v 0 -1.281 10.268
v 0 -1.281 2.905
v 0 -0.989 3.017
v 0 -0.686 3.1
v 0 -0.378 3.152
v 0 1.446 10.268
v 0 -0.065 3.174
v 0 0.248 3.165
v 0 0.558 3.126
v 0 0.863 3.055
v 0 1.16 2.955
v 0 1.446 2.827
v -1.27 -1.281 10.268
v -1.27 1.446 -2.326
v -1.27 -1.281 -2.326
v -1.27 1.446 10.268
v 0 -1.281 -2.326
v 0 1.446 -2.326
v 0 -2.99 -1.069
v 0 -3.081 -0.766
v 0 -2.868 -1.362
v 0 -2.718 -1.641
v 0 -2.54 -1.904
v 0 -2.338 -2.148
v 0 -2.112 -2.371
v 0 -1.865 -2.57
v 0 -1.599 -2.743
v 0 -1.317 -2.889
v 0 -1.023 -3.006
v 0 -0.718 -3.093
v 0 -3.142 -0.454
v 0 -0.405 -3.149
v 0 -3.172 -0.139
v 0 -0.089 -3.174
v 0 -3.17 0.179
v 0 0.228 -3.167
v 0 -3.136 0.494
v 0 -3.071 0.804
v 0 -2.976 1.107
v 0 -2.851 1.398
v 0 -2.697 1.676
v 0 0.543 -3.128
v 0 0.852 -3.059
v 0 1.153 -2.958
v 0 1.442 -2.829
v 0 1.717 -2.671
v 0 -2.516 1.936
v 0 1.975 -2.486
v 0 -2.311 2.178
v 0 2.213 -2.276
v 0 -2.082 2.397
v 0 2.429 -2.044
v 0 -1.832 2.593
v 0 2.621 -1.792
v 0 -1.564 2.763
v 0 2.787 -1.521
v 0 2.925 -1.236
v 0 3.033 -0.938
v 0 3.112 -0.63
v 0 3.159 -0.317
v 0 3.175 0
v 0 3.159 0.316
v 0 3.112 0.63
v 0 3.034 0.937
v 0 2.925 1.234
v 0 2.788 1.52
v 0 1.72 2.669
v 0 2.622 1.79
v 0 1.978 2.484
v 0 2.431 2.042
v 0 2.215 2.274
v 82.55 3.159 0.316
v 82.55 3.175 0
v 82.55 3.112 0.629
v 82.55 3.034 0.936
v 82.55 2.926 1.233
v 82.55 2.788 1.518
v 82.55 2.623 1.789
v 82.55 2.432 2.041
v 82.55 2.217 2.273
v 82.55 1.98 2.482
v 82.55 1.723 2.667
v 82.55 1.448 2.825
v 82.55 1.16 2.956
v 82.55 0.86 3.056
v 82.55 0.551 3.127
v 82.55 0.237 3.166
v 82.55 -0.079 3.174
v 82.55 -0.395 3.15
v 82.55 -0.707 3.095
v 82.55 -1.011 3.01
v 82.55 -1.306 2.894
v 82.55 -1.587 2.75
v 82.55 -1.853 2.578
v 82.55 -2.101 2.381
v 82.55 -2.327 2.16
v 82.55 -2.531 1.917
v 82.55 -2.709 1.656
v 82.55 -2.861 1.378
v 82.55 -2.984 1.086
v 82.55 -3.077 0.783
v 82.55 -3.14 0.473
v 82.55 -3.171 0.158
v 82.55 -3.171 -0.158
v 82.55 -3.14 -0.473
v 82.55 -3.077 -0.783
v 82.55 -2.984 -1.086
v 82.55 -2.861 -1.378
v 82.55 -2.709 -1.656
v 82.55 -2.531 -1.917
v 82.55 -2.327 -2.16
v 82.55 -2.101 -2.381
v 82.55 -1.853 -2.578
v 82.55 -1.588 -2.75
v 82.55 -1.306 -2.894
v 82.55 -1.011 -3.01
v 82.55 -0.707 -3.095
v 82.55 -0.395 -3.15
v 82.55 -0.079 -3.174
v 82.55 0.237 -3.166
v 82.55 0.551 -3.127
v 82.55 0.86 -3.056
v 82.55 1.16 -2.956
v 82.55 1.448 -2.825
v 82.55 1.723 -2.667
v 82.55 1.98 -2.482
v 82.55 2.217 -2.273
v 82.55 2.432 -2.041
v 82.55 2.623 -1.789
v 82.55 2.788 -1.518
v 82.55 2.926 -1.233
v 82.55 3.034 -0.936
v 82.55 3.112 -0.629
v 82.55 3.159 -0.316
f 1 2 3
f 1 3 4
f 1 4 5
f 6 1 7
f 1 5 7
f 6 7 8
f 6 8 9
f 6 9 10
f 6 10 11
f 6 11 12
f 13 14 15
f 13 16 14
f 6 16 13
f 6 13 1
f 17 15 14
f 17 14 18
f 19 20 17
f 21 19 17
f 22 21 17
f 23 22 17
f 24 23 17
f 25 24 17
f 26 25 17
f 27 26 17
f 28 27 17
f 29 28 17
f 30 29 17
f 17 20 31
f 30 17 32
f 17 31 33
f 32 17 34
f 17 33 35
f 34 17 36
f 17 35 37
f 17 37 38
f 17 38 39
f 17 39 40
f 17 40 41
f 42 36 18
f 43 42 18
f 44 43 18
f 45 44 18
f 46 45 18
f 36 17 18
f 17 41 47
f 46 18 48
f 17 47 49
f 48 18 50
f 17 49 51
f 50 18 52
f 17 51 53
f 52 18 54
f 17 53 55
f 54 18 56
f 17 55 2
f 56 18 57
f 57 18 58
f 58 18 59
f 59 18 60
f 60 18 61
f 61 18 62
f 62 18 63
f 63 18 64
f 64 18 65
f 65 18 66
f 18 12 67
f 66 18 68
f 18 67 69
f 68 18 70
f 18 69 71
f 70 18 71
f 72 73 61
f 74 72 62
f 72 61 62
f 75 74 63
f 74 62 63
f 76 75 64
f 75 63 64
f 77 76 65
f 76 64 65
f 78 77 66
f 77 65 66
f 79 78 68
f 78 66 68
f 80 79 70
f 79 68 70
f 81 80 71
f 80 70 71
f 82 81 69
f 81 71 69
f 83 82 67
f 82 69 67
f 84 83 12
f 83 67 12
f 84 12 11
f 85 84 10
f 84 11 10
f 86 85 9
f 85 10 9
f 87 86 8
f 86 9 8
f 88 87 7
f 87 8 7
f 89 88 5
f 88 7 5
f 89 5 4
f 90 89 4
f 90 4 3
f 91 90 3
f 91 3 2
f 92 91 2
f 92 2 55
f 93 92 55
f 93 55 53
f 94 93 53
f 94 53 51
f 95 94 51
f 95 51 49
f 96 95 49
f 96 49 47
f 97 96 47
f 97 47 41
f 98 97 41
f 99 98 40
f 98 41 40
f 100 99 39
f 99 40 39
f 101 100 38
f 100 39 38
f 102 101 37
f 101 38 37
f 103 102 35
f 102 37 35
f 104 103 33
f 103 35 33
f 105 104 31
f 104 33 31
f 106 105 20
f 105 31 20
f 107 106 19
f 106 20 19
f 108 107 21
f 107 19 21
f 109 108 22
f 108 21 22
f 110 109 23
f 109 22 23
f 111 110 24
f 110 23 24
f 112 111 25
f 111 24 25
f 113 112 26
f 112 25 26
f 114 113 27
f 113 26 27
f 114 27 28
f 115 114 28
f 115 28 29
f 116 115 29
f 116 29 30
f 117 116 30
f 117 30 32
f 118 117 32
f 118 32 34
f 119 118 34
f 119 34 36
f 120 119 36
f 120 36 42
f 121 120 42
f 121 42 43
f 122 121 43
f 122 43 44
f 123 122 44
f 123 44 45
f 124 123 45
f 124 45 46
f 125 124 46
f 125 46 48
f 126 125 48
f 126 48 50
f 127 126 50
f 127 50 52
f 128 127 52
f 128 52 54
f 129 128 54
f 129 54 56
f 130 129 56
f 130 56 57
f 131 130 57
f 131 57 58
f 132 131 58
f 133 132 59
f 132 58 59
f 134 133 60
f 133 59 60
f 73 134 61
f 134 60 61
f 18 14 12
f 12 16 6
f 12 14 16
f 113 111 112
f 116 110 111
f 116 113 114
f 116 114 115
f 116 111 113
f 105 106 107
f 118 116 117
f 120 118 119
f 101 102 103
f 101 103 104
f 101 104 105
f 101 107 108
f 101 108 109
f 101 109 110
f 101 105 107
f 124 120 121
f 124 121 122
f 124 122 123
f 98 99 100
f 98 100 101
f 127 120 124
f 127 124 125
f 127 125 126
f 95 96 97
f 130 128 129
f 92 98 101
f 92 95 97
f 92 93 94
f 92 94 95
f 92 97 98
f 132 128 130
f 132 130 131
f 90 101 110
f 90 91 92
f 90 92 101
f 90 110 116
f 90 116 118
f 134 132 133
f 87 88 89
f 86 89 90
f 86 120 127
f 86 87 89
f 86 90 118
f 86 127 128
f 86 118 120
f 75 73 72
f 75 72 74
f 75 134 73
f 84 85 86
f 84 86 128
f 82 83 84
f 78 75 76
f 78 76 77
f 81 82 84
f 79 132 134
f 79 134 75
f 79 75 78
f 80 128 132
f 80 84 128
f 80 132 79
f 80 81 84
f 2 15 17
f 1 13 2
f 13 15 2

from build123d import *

# Parameters (mm, degrees)
F0_R     = 3.175
F1_DEPTH = 82.55
F2_W     = 2.726714
F2_H     = 1.16385
F3_DEPTH = 1.27
F4_W     = 1.27
F4_H     = 2.726714
F5_DEPTH = 7.62
F6_W     = 1.27
F6_H     = 2.726714
F7_DEPTH = 3.81


with BuildPart() as f1:
    # F0 (on Right) → F1 (new body)
    with BuildSketch(Plane.YZ):
        Circle(F0_R)
    extrude(amount=F1_DEPTH)

    # F2 (on face) → F3 (join)
    with BuildSketch(Plane.YZ):
        with Locations((0.08243, 2.065926)):
            Rectangle(F2_W, F2_H)
    extrude(amount=-F3_DEPTH)

    # F4 (on face) → F5 (join)
    with BuildSketch(Plane.XY.offset(2.647851)):
        with Locations((-0.635, 0.08243)):
            Rectangle(F4_W, F4_H)
    extrude(amount=F5_DEPTH)

    # F6 (on face) → F7 (join)
    with BuildSketch(Plane(origin=(0, 0, 1.484001), x_dir=(1, 0, 0), z_dir=(0, 0, -1))):
        with Locations((-0.635, -0.08243)):
            Rectangle(F6_W, F6_H)
    extrude(amount=F7_DEPTH)


solid = f1.part
